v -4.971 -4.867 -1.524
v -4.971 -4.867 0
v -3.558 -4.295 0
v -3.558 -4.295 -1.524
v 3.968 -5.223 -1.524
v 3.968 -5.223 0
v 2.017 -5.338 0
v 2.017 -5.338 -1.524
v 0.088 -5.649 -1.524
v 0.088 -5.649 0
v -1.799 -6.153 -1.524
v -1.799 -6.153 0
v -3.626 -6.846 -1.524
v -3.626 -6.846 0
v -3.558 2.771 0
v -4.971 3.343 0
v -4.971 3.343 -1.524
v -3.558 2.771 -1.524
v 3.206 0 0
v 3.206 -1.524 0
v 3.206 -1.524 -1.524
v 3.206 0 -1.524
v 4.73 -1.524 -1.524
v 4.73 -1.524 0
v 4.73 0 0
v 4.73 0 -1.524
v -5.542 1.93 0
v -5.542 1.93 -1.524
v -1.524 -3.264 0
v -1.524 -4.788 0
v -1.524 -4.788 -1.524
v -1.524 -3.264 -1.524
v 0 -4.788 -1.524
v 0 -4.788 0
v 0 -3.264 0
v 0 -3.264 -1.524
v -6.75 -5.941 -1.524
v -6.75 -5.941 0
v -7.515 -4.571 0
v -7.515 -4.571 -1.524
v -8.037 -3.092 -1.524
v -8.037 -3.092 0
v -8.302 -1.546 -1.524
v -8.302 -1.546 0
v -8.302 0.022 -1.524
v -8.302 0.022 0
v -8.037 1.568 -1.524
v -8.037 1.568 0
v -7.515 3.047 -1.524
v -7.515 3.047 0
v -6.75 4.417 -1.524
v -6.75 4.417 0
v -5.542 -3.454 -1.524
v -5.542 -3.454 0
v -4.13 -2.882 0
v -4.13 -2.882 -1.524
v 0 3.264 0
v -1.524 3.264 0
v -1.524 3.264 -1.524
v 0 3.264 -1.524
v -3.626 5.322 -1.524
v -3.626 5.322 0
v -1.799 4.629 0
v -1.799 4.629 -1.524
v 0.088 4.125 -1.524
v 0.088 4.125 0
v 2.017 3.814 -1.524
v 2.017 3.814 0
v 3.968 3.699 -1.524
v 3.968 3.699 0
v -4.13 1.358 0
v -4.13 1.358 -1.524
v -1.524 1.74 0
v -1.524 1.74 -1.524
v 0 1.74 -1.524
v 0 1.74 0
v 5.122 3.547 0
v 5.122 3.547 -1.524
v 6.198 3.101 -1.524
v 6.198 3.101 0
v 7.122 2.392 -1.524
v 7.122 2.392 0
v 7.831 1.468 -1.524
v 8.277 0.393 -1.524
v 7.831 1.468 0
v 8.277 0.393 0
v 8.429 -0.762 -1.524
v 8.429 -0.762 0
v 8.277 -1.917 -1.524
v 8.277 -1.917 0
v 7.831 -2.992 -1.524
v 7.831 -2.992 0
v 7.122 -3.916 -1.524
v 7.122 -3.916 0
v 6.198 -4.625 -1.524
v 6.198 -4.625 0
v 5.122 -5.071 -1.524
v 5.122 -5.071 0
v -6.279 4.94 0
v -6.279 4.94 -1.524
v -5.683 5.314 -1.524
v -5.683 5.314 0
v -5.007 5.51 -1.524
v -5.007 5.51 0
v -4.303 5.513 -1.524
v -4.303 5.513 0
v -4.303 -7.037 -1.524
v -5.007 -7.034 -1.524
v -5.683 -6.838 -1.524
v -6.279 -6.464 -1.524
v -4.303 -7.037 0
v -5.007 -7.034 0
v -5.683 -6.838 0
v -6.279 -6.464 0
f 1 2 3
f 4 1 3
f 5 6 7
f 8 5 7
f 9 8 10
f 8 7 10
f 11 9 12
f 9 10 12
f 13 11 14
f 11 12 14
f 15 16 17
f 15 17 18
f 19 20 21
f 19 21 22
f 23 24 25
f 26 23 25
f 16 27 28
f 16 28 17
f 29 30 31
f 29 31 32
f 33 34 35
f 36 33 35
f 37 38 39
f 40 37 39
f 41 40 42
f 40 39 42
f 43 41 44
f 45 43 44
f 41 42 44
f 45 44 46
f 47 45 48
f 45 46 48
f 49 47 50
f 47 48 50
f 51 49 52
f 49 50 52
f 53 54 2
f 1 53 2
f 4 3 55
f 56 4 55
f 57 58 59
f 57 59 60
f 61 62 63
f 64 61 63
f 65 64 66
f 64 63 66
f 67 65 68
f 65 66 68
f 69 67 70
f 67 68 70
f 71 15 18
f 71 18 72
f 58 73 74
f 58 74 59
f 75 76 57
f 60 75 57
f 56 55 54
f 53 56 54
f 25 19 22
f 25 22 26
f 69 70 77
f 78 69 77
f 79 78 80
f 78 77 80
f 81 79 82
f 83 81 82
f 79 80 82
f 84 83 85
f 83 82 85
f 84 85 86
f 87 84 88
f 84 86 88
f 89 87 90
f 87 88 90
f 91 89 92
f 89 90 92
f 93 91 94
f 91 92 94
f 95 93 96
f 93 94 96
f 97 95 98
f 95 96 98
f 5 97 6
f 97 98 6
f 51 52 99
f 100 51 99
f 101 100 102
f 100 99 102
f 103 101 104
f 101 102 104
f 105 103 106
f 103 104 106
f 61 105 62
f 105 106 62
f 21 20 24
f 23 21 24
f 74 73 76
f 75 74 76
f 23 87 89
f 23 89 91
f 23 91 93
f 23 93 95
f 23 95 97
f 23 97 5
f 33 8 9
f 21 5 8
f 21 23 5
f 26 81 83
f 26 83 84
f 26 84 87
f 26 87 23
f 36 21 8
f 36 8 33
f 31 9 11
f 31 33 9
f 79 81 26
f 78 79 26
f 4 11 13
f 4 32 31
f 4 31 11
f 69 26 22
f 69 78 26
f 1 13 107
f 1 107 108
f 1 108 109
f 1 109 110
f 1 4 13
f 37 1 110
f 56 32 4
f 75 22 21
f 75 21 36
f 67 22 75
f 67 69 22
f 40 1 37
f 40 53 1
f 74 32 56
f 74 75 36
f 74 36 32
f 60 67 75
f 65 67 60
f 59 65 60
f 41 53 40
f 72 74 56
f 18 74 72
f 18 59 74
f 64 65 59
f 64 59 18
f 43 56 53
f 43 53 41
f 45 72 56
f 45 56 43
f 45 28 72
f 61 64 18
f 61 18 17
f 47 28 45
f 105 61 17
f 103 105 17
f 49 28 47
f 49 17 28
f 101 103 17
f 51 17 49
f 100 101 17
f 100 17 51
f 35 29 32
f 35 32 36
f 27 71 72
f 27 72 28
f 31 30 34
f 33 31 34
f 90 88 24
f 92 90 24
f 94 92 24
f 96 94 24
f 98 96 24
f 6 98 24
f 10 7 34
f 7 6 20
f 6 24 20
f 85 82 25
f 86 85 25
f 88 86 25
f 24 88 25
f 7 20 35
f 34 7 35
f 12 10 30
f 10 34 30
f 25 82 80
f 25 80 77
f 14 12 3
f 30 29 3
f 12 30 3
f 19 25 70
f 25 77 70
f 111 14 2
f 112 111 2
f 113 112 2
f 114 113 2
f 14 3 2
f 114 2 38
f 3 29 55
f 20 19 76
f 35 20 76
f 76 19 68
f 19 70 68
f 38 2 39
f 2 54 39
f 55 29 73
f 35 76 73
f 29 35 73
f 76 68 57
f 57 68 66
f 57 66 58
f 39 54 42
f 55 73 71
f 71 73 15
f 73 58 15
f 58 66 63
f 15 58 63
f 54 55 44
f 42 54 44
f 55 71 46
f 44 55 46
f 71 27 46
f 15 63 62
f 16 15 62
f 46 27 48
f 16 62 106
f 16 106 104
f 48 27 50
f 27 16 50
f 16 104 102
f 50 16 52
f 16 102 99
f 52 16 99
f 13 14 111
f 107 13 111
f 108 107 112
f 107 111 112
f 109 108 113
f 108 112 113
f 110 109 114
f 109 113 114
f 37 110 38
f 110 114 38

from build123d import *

# Parameters (mm, degrees)
SKETCH1_W           = 1.524
SKETCH1_H           = 1.524
BOSS_EXTRUDE1_DEPTH = 1.524


with BuildPart() as part:
    # Sketch1 → Boss-Extrude1 (new body)
    with BuildSketch(Plane.XY):
        with BuildLine():
            ThreePointArc((-3.625849071, -6.846112432), (-5.351927636, -6.959401294), (-6.750279516, -5.941170673))
            ThreePointArc((-6.750279516, -5.941170673), (-8.335255099, -0.762), (-6.750279516, 4.417170673))
            ThreePointArc((-6.750279516, 4.417170673), (-5.351927636, 5.435401294), (-3.625849071, 5.322112432))
            ThreePointArc((-3.625849071, 5.322112432), (0.088431716, 4.124975631), (3.96754689, 3.69896653))
            ThreePointArc((3.96754689, 3.69896653), (8.42851342, -0.762), (3.96754689, -5.22296653))
            ThreePointArc((3.96754689, -5.22296653), (0.088431716, -5.648975631), (-3.625849071, -6.846112432))
        make_face()
        with Locations((-0.762, -4.025750638)):
            Rectangle(SKETCH1_W, SKETCH1_H, mode=Mode.SUBTRACT)
        with Locations((-0.762, 2.501750638)):
            Rectangle(SKETCH1_W, SKETCH1_H, mode=Mode.SUBTRACT)
        with Locations((3.96754689, -0.762)):
            Rectangle(SKETCH1_W, SKETCH1_H, mode=Mode.SUBTRACT)
        Polygon((-5.542485833, 1.929853233), (-4.970674394, 3.342513022), (-3.558014606, 2.770701583), (-4.129826044, 1.358041795), align=None, mode=Mode.SUBTRACT)
        Polygon((-4.129826044, -2.882041795), (-5.542485833, -3.453853233), (-4.970674394, -4.866513022), (-3.558014606, -4.294701583), align=None, mode=Mode.SUBTRACT)
    extrude(amount=-BOSS_EXTRUDE1_DEPTH)


solid = part.part
